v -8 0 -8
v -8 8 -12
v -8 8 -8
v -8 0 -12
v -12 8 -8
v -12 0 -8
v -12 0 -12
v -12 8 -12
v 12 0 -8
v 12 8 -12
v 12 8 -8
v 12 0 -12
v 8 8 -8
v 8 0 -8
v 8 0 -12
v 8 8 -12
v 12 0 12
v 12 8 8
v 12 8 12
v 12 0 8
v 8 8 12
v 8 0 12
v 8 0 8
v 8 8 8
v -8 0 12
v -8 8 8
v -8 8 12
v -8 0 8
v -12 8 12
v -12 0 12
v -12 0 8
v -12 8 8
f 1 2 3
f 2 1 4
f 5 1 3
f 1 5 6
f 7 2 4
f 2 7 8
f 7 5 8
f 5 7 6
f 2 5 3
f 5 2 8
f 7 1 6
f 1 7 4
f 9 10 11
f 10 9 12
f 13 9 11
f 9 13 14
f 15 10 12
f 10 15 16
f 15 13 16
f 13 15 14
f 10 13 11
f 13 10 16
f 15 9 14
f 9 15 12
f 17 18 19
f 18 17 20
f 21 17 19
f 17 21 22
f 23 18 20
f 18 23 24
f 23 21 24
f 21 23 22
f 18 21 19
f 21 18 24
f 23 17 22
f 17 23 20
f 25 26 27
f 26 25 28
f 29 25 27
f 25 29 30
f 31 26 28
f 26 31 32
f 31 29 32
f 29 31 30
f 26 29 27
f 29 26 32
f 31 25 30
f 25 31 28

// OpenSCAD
translate([-12,0,-12])//we can use negative values only in translate function not in other like cube or sphere.

cube([4,8,4]);
translate([8,0,-12])
cube([4,8,4]);
translate([8,0,8])
cube([4,8,4]);
translate([-12,0,8])
cube([4,8,4]);
